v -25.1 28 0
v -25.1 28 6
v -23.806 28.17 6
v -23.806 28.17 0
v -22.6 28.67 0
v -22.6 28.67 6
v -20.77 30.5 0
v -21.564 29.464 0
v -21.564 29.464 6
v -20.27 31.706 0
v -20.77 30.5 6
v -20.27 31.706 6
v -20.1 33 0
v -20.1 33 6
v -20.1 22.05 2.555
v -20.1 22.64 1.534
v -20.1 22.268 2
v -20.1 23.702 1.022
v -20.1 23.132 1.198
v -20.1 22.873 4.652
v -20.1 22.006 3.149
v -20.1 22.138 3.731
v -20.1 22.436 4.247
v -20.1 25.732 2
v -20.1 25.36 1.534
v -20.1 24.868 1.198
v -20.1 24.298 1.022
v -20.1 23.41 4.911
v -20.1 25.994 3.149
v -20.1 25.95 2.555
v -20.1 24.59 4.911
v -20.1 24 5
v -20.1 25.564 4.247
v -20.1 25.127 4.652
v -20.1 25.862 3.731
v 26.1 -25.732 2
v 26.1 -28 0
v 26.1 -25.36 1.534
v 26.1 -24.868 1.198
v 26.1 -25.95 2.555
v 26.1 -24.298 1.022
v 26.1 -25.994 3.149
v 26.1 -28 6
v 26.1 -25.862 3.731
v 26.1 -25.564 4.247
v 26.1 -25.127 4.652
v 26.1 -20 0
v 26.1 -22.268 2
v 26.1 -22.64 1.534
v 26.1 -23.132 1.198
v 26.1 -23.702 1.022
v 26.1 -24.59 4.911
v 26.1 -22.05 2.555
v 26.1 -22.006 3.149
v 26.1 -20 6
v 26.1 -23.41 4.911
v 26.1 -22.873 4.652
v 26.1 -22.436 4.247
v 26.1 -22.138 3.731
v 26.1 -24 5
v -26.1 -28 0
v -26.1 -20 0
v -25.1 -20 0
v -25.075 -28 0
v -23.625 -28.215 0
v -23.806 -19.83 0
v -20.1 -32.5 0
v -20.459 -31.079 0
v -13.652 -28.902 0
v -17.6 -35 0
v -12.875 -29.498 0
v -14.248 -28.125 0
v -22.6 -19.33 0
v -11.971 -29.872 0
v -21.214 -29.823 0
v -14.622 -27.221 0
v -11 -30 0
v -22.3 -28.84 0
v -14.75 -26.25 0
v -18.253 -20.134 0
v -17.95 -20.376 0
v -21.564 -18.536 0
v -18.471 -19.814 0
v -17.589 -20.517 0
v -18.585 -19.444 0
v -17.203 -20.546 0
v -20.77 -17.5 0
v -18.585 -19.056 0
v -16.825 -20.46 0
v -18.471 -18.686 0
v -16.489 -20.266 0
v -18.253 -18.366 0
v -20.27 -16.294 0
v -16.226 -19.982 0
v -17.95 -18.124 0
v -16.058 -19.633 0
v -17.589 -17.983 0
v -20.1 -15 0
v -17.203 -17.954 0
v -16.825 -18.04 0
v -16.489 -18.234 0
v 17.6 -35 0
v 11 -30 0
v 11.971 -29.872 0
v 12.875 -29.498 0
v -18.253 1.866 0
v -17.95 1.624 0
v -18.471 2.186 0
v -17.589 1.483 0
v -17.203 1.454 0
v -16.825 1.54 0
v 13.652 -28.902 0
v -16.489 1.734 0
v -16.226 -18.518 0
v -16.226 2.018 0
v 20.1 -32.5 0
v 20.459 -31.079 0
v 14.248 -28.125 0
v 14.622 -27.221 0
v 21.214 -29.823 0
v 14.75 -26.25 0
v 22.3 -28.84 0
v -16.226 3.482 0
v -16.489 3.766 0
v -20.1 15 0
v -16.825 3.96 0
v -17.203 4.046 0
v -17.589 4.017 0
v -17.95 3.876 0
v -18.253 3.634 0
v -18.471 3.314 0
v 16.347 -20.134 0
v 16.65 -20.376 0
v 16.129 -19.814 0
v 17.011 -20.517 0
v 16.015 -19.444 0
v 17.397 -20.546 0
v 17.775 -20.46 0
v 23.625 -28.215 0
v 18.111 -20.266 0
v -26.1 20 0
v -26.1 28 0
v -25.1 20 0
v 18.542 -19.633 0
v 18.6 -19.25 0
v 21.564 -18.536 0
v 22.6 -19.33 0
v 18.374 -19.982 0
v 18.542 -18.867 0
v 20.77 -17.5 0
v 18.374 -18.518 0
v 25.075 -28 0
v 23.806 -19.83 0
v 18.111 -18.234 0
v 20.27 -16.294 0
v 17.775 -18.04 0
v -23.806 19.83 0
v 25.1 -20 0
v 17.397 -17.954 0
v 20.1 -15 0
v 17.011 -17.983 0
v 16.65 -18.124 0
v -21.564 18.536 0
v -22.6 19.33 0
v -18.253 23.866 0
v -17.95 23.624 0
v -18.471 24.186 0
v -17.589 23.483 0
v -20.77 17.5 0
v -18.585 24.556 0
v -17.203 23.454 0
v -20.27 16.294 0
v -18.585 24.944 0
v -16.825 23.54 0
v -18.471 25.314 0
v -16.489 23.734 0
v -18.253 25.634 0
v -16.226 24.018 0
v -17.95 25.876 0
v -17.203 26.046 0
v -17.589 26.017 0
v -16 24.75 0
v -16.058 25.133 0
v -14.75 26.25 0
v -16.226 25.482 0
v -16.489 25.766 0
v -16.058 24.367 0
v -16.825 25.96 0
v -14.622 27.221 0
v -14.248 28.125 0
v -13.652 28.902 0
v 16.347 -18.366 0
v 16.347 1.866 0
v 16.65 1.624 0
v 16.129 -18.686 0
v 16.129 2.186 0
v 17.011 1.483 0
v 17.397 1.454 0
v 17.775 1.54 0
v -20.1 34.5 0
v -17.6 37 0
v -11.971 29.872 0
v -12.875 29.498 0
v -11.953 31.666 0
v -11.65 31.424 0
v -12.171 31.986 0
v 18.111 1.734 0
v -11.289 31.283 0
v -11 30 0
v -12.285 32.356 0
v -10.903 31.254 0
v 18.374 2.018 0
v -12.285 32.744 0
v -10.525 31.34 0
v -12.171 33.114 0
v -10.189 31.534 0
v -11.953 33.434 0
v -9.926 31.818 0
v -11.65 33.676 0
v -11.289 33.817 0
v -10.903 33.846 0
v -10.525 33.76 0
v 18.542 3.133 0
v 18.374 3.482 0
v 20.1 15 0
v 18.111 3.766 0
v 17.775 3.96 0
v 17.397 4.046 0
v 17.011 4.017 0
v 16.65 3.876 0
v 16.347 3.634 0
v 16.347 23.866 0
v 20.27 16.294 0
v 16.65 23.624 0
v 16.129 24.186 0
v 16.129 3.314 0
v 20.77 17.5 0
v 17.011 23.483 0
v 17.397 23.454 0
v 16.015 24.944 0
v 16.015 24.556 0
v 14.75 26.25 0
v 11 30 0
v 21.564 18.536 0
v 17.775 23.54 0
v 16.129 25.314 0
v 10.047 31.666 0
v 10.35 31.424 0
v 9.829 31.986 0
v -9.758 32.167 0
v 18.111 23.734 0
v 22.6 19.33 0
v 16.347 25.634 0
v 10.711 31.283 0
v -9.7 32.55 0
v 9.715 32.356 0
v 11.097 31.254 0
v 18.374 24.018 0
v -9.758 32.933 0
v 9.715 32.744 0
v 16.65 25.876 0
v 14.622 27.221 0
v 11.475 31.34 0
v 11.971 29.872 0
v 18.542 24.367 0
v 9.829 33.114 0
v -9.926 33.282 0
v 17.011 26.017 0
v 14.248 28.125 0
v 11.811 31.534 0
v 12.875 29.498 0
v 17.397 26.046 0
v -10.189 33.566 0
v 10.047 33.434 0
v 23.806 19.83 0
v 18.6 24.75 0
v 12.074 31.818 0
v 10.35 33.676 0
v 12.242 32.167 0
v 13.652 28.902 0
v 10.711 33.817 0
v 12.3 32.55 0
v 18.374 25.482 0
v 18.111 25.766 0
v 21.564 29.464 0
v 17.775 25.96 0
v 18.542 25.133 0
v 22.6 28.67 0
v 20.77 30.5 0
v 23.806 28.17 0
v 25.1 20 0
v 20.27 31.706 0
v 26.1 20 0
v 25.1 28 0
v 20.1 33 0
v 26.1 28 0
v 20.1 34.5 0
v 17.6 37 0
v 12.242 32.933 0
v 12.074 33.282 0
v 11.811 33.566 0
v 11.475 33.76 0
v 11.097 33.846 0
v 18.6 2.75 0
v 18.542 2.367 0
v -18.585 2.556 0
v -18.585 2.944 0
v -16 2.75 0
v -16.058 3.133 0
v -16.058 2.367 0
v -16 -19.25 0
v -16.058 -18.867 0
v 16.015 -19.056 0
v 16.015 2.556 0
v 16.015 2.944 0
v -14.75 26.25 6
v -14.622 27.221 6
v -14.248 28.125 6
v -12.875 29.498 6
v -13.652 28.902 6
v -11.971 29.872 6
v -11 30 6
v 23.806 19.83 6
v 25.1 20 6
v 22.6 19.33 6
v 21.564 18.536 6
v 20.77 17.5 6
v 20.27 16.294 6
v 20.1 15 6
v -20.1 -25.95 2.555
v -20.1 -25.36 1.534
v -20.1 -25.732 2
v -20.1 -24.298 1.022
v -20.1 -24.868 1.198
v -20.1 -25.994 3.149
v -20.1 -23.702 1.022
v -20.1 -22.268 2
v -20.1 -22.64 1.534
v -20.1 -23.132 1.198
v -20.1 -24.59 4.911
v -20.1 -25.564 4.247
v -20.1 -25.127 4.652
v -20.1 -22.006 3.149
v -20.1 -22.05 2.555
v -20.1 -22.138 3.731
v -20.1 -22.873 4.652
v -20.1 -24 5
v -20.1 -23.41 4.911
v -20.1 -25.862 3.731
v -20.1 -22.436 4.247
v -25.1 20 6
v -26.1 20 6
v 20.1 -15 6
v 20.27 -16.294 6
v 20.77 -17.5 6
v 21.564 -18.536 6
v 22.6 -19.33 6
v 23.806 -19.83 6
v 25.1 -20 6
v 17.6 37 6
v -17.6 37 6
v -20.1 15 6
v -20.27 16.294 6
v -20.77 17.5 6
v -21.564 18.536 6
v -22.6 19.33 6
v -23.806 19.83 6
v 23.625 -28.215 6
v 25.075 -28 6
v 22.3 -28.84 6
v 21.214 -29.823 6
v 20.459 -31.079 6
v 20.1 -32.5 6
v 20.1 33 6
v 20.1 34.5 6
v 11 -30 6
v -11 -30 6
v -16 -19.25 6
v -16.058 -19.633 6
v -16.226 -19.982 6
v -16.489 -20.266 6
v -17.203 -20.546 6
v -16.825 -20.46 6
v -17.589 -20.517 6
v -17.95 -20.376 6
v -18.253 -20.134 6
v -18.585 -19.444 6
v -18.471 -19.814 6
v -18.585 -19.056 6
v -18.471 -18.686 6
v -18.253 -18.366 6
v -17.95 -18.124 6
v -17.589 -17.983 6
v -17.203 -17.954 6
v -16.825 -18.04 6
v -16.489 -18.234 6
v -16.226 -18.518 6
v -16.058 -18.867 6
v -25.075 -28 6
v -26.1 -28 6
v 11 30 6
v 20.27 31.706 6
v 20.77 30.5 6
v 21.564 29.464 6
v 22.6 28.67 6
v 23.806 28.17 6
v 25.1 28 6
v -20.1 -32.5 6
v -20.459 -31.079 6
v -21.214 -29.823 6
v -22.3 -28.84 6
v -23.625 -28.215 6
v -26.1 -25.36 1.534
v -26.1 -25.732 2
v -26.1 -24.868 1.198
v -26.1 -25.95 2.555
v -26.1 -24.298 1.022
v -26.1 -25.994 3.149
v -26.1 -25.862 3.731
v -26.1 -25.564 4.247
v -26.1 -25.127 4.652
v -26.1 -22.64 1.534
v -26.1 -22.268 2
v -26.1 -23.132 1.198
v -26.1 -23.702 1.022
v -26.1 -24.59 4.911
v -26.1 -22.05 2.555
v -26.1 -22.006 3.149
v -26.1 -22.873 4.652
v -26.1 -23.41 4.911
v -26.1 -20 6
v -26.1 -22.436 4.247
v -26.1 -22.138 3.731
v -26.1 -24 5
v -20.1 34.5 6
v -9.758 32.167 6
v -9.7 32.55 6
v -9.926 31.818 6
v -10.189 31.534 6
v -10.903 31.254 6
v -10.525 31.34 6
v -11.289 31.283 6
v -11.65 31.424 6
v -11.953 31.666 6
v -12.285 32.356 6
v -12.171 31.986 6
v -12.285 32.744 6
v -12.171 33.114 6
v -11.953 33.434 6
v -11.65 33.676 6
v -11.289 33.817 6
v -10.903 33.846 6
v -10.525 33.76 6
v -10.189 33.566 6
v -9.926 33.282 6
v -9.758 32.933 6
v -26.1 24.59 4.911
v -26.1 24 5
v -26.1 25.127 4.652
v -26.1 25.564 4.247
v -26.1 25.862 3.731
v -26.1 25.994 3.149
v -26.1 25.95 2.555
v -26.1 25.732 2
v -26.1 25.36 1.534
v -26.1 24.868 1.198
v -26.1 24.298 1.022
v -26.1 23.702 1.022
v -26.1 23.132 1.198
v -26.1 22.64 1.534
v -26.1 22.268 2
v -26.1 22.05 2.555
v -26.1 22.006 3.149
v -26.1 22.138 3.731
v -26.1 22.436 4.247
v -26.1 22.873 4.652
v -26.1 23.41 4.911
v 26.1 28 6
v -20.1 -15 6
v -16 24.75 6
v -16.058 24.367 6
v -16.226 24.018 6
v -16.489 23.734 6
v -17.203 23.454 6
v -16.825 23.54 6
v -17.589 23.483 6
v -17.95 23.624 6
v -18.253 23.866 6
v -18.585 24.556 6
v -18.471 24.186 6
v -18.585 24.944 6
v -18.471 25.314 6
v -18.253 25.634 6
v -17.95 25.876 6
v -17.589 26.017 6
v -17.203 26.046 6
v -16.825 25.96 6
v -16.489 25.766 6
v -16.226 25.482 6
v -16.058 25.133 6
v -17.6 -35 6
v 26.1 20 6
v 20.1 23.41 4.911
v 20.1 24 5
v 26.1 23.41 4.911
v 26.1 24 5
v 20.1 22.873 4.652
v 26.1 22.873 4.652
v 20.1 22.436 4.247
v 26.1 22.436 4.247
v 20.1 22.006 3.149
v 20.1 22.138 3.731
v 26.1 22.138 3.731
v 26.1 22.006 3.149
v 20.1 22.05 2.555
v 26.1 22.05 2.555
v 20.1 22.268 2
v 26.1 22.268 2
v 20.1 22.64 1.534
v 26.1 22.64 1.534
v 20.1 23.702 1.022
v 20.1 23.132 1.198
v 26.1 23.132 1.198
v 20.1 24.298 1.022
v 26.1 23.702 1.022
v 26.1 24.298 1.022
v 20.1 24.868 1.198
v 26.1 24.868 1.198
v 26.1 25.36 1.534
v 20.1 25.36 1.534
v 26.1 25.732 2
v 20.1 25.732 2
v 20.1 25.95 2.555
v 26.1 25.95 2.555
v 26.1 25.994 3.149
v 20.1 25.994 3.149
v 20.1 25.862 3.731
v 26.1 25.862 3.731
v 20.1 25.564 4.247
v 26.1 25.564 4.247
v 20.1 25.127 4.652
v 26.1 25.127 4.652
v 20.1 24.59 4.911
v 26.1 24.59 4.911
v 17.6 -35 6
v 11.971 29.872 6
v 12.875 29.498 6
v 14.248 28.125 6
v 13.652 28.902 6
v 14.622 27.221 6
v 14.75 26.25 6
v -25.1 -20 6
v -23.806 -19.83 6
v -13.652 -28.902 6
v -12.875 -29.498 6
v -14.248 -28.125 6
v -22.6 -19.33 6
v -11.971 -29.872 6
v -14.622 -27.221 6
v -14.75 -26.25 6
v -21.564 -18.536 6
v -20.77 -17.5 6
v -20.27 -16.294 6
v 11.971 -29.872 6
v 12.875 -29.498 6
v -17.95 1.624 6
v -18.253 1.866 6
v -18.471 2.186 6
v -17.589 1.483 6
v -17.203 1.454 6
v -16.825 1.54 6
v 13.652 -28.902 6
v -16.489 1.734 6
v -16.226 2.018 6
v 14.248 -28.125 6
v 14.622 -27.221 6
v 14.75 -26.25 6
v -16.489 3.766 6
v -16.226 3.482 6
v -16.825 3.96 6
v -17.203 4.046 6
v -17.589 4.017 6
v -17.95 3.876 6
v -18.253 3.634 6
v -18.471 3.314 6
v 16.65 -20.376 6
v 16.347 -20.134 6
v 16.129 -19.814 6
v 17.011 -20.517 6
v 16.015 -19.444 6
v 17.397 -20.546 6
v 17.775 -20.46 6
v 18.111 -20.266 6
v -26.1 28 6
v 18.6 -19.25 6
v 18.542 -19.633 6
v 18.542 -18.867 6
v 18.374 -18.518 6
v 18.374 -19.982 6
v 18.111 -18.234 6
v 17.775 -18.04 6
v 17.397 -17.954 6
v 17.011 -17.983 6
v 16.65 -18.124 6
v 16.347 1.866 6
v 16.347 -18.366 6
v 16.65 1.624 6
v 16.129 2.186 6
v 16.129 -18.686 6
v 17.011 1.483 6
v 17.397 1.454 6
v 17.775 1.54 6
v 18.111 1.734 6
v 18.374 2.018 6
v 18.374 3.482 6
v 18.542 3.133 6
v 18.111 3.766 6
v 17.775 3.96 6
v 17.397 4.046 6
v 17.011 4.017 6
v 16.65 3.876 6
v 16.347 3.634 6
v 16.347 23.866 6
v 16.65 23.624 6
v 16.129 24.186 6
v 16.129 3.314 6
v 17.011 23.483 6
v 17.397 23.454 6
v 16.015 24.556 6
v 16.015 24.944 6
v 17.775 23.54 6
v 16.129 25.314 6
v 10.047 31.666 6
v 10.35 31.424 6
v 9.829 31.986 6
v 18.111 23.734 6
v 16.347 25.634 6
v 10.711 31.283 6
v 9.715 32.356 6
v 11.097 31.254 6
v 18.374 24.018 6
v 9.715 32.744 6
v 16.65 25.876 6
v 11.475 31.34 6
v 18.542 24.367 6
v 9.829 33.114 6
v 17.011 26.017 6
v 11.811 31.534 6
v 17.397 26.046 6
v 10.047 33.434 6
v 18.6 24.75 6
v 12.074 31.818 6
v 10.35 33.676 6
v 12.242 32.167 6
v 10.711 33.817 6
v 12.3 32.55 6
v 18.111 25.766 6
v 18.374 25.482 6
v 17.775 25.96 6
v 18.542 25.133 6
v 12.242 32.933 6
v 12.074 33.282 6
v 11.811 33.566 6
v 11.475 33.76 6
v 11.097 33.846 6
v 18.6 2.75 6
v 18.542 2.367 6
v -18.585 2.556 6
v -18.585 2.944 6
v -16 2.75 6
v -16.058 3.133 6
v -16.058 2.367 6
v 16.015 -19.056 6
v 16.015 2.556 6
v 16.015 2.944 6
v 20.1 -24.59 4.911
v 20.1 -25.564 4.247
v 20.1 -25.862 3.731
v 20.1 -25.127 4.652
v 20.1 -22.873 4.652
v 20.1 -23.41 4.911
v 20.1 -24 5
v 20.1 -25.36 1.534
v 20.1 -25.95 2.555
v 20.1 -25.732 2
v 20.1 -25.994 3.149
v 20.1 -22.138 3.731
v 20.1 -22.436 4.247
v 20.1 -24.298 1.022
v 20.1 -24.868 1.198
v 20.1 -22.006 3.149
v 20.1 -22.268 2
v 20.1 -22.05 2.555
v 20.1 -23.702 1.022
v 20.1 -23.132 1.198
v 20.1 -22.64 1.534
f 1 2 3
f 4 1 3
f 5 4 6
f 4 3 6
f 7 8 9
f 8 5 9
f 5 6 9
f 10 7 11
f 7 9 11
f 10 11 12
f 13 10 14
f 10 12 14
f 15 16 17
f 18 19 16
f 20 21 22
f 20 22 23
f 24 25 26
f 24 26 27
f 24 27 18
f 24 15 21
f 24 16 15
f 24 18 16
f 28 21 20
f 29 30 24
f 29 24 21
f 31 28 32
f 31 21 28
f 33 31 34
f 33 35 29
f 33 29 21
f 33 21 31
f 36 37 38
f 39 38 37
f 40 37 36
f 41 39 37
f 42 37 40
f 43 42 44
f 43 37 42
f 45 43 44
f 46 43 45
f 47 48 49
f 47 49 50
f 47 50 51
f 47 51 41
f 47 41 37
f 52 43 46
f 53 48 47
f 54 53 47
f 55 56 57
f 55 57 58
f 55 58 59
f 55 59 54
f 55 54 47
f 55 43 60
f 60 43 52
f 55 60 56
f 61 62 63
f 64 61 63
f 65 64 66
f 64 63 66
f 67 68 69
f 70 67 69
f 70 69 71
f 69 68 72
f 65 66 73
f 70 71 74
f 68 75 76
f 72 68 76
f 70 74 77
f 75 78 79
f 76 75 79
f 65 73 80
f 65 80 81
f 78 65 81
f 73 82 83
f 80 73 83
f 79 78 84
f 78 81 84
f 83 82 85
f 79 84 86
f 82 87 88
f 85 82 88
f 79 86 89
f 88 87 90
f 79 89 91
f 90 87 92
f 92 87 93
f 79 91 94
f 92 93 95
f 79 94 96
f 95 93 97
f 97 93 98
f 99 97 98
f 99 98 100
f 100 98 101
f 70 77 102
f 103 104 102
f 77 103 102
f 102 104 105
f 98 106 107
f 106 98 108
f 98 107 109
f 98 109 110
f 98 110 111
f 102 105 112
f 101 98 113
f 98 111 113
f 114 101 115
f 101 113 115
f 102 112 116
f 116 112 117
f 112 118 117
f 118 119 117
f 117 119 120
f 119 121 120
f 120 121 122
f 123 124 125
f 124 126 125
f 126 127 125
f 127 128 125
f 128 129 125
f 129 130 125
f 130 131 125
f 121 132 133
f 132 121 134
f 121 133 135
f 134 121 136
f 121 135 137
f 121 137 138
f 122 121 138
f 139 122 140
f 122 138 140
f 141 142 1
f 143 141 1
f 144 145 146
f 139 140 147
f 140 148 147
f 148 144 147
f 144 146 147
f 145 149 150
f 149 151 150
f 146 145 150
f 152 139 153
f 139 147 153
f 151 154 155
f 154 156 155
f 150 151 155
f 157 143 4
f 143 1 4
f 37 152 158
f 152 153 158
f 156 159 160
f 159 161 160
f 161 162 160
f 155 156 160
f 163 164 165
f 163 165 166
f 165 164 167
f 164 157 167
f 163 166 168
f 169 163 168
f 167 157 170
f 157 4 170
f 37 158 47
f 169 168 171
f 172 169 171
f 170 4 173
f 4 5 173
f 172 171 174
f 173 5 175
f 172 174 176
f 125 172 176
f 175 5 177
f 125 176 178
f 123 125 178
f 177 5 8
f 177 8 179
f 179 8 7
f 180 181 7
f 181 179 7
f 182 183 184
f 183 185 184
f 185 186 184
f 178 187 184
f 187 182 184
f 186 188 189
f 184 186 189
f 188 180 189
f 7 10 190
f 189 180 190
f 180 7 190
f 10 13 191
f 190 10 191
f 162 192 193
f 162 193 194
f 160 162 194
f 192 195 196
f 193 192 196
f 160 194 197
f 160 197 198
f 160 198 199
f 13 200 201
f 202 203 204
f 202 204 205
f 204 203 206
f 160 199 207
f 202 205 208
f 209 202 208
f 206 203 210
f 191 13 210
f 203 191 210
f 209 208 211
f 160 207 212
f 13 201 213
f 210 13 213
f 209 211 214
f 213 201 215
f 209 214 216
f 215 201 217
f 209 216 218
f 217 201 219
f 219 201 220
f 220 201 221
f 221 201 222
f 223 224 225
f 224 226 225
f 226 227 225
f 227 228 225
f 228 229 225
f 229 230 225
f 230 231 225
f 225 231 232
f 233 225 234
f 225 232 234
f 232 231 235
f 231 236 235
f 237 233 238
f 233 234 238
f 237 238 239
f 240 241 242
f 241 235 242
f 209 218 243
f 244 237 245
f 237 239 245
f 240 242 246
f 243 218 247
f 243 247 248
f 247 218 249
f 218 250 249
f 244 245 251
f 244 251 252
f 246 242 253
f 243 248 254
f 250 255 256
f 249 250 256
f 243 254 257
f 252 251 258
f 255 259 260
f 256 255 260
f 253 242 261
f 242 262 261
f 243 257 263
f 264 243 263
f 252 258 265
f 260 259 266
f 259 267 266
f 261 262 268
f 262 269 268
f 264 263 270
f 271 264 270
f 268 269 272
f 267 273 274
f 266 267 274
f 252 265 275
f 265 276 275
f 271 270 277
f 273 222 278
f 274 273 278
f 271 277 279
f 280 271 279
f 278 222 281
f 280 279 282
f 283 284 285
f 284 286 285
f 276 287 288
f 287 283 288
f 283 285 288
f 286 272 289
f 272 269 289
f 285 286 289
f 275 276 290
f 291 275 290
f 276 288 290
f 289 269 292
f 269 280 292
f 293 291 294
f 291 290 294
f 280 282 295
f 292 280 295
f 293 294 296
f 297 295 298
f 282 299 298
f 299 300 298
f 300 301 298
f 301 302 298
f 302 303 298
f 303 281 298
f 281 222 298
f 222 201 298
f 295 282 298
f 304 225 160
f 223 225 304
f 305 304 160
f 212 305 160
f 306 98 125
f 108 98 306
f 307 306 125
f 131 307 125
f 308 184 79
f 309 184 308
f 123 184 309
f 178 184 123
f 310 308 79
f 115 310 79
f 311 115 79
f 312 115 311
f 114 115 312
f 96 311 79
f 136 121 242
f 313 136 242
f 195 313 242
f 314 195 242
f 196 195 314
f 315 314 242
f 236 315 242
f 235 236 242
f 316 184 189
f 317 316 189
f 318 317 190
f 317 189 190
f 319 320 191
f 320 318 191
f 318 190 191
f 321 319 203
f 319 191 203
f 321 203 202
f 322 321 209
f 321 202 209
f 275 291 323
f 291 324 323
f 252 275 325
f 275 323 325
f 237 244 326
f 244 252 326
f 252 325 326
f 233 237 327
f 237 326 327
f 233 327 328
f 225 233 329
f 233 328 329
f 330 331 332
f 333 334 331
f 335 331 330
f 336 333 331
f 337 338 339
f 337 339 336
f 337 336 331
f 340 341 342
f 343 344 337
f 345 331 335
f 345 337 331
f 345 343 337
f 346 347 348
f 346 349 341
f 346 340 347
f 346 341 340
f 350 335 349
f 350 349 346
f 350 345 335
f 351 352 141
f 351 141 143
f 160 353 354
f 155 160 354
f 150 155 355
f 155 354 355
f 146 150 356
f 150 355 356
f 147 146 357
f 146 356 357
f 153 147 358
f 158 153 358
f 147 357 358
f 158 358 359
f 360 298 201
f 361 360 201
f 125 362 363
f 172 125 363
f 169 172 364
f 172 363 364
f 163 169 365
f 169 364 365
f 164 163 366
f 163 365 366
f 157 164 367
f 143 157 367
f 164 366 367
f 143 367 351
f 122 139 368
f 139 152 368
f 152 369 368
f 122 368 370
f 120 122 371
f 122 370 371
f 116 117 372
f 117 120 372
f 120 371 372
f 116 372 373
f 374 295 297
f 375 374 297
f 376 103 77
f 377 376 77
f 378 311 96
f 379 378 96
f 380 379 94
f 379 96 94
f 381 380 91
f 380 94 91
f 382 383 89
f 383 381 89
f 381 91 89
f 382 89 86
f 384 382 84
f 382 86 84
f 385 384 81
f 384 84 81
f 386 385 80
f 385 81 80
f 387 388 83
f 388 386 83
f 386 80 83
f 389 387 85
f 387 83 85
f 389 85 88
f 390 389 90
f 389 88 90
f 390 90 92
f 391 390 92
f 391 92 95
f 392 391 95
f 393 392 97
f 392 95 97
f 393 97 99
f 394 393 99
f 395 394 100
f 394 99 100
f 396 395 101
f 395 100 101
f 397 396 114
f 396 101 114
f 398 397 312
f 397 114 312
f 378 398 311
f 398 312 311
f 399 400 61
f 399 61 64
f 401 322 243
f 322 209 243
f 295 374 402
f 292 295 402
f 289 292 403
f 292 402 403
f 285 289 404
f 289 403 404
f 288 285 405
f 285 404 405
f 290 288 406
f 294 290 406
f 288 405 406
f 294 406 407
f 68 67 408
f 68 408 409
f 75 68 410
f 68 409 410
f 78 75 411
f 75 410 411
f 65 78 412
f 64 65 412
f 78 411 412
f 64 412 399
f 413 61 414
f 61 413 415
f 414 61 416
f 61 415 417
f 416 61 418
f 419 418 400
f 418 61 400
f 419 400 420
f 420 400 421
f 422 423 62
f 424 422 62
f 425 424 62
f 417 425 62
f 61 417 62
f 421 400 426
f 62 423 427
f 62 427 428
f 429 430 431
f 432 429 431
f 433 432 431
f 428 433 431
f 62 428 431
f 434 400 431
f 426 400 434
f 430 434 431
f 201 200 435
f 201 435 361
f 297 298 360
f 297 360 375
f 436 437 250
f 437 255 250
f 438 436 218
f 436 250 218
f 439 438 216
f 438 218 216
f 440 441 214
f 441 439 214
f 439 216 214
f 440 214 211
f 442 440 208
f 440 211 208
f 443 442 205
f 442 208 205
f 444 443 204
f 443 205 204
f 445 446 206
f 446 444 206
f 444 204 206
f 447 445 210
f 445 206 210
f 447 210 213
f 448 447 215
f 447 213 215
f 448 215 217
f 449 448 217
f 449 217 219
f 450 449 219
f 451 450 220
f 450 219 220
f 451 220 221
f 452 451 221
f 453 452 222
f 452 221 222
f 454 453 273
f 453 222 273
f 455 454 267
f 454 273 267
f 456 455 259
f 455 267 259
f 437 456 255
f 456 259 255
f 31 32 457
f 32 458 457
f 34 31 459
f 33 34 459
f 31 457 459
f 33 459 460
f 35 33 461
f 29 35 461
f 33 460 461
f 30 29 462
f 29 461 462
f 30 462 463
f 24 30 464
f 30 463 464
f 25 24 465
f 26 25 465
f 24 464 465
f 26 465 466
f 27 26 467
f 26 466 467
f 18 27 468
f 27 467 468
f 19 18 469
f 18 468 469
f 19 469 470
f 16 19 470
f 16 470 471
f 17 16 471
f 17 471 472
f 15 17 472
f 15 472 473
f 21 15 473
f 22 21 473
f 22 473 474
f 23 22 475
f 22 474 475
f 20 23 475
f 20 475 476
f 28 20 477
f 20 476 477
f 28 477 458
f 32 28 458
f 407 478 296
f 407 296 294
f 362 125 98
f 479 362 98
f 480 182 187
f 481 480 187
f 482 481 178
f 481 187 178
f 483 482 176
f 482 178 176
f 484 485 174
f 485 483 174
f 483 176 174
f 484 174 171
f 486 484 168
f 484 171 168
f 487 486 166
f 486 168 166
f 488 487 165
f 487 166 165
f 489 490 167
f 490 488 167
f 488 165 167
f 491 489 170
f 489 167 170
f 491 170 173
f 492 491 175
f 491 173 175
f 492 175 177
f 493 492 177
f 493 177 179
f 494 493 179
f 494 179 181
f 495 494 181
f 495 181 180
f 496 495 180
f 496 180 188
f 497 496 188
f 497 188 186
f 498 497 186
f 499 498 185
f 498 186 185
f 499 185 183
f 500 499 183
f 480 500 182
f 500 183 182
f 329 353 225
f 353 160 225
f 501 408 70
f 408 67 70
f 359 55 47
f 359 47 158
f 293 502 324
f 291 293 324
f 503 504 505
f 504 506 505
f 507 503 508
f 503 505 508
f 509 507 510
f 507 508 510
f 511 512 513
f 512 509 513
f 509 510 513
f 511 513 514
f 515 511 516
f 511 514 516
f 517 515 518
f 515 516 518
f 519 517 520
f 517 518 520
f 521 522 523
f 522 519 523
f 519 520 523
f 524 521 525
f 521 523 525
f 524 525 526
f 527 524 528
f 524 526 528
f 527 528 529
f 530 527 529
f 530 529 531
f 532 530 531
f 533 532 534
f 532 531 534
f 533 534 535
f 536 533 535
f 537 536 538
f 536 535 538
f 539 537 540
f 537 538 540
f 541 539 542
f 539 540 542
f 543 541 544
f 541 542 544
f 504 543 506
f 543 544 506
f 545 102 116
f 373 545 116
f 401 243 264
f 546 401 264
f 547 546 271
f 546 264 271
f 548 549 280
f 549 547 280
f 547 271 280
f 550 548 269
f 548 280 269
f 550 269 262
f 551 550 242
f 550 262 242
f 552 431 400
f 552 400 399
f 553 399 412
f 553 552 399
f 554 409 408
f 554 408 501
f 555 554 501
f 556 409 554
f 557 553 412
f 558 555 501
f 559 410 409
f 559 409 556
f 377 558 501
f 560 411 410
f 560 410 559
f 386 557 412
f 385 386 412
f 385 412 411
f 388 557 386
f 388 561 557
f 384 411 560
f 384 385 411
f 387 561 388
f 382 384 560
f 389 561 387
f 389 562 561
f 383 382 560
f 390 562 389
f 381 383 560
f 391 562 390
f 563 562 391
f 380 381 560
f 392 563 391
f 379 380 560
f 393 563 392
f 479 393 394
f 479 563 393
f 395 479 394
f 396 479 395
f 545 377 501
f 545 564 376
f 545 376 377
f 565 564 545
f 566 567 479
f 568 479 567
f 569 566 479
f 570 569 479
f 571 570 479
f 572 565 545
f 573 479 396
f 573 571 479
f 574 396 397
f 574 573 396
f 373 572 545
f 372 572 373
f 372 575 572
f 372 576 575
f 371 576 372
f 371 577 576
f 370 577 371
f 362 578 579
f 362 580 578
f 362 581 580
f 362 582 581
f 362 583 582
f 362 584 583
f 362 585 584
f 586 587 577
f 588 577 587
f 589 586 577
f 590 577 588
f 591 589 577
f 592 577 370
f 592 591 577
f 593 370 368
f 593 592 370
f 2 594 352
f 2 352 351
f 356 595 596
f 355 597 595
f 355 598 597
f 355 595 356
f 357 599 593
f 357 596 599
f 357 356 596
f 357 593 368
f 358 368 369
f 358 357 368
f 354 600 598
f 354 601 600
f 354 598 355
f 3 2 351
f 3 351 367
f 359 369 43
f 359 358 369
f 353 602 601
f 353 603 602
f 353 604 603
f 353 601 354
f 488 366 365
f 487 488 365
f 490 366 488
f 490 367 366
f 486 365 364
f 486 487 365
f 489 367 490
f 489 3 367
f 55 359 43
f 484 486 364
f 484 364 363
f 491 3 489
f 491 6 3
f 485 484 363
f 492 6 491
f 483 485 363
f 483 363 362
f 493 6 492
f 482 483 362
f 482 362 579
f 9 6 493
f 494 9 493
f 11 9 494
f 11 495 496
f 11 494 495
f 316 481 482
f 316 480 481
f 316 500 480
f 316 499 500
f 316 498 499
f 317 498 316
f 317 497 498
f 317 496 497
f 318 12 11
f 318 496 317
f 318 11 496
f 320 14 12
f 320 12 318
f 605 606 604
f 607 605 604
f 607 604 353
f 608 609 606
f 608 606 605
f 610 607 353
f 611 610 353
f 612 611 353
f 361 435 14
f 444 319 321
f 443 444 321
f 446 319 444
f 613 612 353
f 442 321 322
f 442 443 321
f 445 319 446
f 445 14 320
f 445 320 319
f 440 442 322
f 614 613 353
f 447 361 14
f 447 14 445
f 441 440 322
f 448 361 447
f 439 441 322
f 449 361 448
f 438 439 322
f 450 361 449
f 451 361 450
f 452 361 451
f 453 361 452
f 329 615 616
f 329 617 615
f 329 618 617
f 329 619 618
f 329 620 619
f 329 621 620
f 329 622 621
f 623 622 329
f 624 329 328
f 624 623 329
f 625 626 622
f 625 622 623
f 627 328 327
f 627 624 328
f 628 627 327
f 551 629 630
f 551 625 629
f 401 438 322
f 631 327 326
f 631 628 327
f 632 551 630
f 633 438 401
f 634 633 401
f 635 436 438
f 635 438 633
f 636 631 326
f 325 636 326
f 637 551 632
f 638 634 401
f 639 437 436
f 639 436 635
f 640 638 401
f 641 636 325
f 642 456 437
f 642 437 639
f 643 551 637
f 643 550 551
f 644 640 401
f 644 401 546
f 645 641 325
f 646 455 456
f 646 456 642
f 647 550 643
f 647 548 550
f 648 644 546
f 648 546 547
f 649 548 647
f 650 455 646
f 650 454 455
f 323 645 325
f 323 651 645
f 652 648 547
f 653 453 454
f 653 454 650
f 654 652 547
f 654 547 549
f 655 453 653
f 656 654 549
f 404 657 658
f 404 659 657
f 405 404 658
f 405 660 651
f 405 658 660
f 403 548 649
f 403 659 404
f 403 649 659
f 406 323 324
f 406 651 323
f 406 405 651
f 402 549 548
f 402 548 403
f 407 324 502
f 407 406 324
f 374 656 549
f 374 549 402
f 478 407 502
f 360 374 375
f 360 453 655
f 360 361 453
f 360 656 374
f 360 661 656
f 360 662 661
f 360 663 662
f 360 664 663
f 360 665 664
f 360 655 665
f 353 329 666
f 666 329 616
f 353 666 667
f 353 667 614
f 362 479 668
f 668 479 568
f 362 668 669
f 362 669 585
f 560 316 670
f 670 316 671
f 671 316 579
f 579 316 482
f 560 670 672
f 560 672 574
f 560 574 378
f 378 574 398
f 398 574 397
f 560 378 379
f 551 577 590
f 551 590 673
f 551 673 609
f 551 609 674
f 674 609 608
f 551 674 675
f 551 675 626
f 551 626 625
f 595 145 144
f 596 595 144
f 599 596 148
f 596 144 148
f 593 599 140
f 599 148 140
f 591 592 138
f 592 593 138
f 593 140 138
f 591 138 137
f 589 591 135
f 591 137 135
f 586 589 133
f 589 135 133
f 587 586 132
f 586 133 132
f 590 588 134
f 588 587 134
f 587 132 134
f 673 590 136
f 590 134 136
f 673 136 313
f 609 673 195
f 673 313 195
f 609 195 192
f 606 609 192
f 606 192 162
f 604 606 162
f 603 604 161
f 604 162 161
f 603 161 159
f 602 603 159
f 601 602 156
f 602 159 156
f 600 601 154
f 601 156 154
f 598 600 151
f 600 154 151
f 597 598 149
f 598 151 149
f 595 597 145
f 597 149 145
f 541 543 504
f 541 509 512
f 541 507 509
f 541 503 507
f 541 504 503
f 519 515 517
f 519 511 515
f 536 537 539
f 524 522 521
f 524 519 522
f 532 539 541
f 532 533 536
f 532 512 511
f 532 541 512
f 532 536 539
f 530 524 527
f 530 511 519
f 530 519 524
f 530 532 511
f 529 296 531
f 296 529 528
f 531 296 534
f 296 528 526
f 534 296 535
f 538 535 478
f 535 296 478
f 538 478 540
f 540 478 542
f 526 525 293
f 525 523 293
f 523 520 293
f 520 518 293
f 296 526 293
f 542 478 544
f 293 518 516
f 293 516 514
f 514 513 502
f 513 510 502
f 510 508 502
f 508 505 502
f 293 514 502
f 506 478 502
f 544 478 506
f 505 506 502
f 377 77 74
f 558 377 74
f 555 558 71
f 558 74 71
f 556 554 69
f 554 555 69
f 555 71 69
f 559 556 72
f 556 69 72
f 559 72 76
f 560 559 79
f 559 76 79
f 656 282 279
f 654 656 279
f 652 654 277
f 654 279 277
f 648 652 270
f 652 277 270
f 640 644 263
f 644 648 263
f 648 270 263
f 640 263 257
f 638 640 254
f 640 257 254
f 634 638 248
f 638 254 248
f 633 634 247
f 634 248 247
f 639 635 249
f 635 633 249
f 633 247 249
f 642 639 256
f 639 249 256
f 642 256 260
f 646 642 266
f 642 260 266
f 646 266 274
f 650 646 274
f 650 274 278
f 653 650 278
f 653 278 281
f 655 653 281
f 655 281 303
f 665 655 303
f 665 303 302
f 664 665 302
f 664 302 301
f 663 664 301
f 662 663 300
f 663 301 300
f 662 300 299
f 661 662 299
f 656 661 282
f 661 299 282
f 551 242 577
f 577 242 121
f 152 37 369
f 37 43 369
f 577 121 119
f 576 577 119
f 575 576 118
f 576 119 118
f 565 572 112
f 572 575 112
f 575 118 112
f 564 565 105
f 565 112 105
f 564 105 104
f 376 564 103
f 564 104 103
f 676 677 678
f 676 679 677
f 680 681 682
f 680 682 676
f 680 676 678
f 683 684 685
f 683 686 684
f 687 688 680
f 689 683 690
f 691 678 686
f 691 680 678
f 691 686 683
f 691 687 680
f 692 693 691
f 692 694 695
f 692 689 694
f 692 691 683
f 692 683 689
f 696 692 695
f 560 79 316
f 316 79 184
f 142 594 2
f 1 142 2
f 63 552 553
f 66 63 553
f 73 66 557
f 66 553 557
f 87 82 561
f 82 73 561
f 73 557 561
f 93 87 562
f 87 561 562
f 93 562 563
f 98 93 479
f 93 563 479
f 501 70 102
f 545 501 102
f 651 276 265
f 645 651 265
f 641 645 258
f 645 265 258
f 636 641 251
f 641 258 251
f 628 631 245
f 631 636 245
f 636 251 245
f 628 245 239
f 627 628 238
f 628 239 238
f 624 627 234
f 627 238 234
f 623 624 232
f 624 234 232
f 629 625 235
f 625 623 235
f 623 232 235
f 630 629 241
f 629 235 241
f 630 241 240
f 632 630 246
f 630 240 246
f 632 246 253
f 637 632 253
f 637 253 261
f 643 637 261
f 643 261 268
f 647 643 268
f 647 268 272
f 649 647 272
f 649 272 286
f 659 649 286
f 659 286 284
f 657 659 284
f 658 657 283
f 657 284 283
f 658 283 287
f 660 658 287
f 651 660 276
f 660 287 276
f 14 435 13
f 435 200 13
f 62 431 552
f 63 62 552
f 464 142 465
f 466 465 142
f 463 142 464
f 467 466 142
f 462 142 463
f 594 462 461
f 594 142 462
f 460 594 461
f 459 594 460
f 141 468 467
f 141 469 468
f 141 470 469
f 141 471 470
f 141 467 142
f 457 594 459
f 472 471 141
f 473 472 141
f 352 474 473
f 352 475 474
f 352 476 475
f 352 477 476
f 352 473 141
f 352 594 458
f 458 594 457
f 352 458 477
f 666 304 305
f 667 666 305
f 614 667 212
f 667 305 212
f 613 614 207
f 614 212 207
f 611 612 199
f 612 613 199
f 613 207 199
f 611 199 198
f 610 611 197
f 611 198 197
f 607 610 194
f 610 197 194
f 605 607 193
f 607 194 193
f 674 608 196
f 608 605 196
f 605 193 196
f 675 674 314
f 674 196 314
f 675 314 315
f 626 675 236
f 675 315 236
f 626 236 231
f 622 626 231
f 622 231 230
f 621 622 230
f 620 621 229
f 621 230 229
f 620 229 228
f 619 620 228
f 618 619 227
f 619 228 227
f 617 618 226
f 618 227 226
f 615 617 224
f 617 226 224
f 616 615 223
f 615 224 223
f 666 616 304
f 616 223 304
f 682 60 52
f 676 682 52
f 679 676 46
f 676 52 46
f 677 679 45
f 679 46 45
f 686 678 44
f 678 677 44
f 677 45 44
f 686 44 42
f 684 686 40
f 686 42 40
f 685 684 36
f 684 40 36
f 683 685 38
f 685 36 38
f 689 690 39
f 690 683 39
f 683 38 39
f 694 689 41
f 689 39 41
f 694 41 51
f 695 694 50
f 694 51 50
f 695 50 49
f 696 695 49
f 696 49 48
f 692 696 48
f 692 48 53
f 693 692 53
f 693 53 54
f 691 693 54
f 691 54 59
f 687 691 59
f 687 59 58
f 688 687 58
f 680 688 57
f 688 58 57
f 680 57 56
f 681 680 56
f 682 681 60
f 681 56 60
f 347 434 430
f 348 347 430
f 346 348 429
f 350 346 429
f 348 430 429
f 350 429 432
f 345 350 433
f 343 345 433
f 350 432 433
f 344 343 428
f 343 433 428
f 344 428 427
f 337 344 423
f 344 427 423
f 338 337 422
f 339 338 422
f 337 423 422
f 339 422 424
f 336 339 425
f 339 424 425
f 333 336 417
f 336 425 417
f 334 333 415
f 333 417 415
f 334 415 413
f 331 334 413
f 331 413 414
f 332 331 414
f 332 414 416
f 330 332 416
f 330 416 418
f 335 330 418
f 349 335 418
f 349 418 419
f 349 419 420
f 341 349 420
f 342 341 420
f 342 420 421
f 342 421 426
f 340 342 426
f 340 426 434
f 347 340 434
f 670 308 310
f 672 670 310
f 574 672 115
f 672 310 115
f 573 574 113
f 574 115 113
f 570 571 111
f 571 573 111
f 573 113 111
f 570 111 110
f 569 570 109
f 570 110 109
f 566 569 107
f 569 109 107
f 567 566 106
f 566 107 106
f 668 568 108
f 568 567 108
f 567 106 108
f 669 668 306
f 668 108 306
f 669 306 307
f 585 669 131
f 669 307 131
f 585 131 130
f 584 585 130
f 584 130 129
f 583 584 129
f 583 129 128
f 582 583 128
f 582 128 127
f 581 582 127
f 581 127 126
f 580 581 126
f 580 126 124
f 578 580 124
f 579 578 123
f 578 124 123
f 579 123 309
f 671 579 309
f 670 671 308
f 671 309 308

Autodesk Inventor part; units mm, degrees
ref_plane "YZ Plane" through (0, 0, 0) normal (1, 0, 0) x (0, 1, 0)
ref_plane "XZ Plane" through (0, 0, 0) normal (0, 1, 0) x (-1, 0, 0)
ref_plane "XY Plane" through (0, 0, 0) normal (0, 0, 1) x (1, 0, 0)
sketch "Sketch1" plane through (0, 0, 0) normal (0, 0, 1) x (1, 0, 0)
  line L0 (-11, -29.75) -> (11, -29.75) construction
  line L1 (14.5, -26.25) -> (14.5, 26.25) construction
  line L2 (11, 29.75) -> (-11, 29.75) construction
  line L3 (-14.5, 26.25) -> (-14.5, -26.25) construction
  line L4 (-14.5, -29.75) -> (14.5, 29.75) construction
  line L5 (14.5, -29.75) -> (-14.5, 29.75) construction
  arc A0 (-11, 29.75) -> (-14.5, 26.25) centre (-11, 26.25) ccw construction
  arc A1 (14.5, 26.25) -> (11, 29.75) centre (11, 26.25) ccw construction
  arc A2 (11, -29.75) -> (14.5, -26.25) centre (11, -26.25) ccw
  arc A3 (-14.5, -26.25) -> (-11, -29.75) centre (-11, -26.25) ccw construction
  line L6 (-17.6, -35) -> (17.6, -35)
  line L7 (20.1, -32.5) -> (20.1, 34.5)
  line L8 (17.6, 37) -> (-17.6, 37)
  line L9 (-20.1, 34.5) -> (-20.1, -32.5)
  line L10 (-20.1, -35) -> (20.1, 37) construction
  line L11 (20.1, -35) -> (-20.1, 37) construction
  line L12 (-20.1, 34.5) -> (-17.6, 37)
  line L13 (-20.1, -32.5) -> (-17.6, -35)
  line L14 (17.6, -35) -> (20.1, -32.5)
  line L15 (17.6, 37) -> (20.1, 34.5)
  circle A4 centre (0, -15.25) radius 14 construction
  circle A5 centre (-17.3, -19.25) radius 1.3
  circle A6 centre (-17.3, 2.75) radius 1.3
  circle A7 centre (-17.3, 24.75) radius 1.3
  circle A8 centre (-11, 32.55) radius 1.3
  line L16 (0, -15.25) -> (0, -1.25) construction
  circle A9 centre (17.3, -19.25) radius 1.3
  circle A10 centre (17.3, 2.75) radius 1.3
  circle A11 centre (17.3, 24.75) radius 1.3
  circle A12 centre (11, 32.55) radius 1.3
  line L17 (-11, 30) -> (11, 30)
  arc A13 (14.75, 26.25) -> (11, 30) centre (11, 26.25) ccw
  line L18 (14.75, 26.25) -> (14.75, -26.25)
  arc A14 (11, -30) -> (14.75, -26.25) centre (11, -26.25) ccw
  line L19 (11, -30) -> (-11, -30)
  arc A15 (-14.75, -26.25) -> (-11, -30) centre (-11, -26.25) ccw
  line L20 (-14.75, -26.25) -> (-14.75, 26.25)
  arc A16 (-11, 30) -> (-14.75, 26.25) centre (-11, 26.25) ccw
  point P0 (0, 0)
  point P1 (0, 1)
  point P2 (0, 29.75)
  dimension "d14" = 28
  dimension "d0" = 29
  dimension "d1" = 59.5
  dimension "d2" = 3.5
  dimension "d3" = 40.2
  dimension "d4" = 72
  dimension "d6" = 2.5
  dimension "d7" = 2.5
  dimension "d8" = 2.5
  dimension "d9" = 2.5
  dimension "d10" = 2.5
  dimension "d11" = 2.5
  dimension "d12" = 2.5
  dimension "d13" = 2.5
  dimension "d15" = 45
  dimension "d16" = 2.6
  dimension "d17" = 17.3
  dimension "d18" = 4
  dimension "d19" = 2.6
  dimension "d20" = 22
  dimension "d21" = 2.6
  dimension "d22" = 22
  dimension "d24" = 2.6
  dimension "d26" = 7.8
  dimension "d27" = 11
  dimension "d28" = 1
  dimension "d51" = 0.25
extrude "Extrusion1" add sketch "Sketch1" along normal blind 6
sketch "Sketch2" plane through (0, 0, 6) normal (0, 0, 1) x (1, 0, 0)
  line L0 (26.1, 28) -> (26.1, 20)
  line L1 (20.1, -32.5) -> (20.1, 34.5) projected
  line L2 (26.1, 20) -> (20.1, 20)
  line L3 (26.1, 28) -> (20.1, 28)
  line L4 (-14.5, 0) -> (14.5, 0) construction
  line L5 (0, 29.4068) -> (0, -29.4068) construction
  line L6 (-26.1, 28) -> (-26.1, 20)
  line L7 (-26.1, 20) -> (-20.1, 20)
  line L8 (-26.1, 28) -> (-20.1, 28)
  line L9 (26.1, -28) -> (26.1, -20)
  line L10 (26.1, -20) -> (20.1, -20)
  line L11 (26.1, -28) -> (20.1, -28)
  line L12 (-26.1, -20) -> (-20.1, -20)
  line L13 (-26.1, -28) -> (-26.1, -20)
  line L14 (-26.1, -28) -> (-20.1, -28)
  line L15 (-20.1, 28) -> (-20.1, 20)
  line L16 (-20.1, 34.5) -> (-20.1, -32.5) projected
  line L17 (-20.1, -20) -> (-20.1, -28)
  line L18 (-20.1, 34.5) -> (-20.1, -32.5) projected
  point P0 (0, 0)
  point P1 (26.1, 24)
  point P2 (20.1, -20)
  point P3 (20.1, -28)
  point P4 (0, 0)
  dimension "d31" = 24
  dimension "d32" = 8
  dimension "d33" = 6
extrude "Extrusion2" add sketch "Sketch2" against normal up to surface (6 mm away)
fillet "Fillet1" radius 5 8 edges at (20.1, 28, 3) (-20.1, 28, 3) (-20.1, -20, 3) (-20.1, -28, 3) (20.1, -28, 3) (20.1, 20, 3) (20.1, -20, 3) (-20.1, 20, 3)
sketch "Sketch3" plane through (-26.1, 20, 6) normal (-1, 0, 0) x (0, 0, 1)
  line L0 (-6, 0) -> (-6, 8) construction
  line L1 (0, 0) -> (-6, 0) construction
  line L2 (0, 8) -> (0, 0) construction
  line L3 (0, 8) -> (-6, 8) construction
  line L4 (0, 8) -> (-6, 0) construction
  circle A0 centre (-3, 4) radius 2
  line L5 (-6, -48) -> (-6, -40) construction
  line L6 (0, -48) -> (-6, -48) construction
  line L7 (0, -40) -> (0, -48) construction
  line L8 (0, -40) -> (-6, -40) construction
  line L9 (0, -40) -> (-6, -48) construction
  circle A1 centre (-3, -44) radius 2
  point P0 (-6, -20)
  dimension "d37" = 4
  dimension "d38" = 4
extrude "Extrusion3" cut sketch "Sketch3" against normal blind 6
mirror "Mirror1" about plane through (0, 0, 0) normal (1, 0, 0) of "Extrusion3"
thread "Thread1" size "M4x0.7" class "6H" standard "ANSI Metric M Profile" full length
thread "Thread2" size "M4x0.7" class "6H" standard "ANSI Metric M Profile" full length
thread "Thread3" size "M4x0.7" class "6H" standard "ANSI Metric M Profile" full length
thread "Thread4" size "M4x0.7" class "6H" standard "ANSI Metric M Profile" full length
equation "\"d7\" = d6"
equation "\"d8\" = d6"
equation "\"d9\" = d8"
equation "\"d10\" = d6"
equation "\"d11\" = d10"
equation "\"d12\" = d6"
equation "\"d13\" = d12"
properties part number "DynamixelServoMount" material "Aluminum 6061"
